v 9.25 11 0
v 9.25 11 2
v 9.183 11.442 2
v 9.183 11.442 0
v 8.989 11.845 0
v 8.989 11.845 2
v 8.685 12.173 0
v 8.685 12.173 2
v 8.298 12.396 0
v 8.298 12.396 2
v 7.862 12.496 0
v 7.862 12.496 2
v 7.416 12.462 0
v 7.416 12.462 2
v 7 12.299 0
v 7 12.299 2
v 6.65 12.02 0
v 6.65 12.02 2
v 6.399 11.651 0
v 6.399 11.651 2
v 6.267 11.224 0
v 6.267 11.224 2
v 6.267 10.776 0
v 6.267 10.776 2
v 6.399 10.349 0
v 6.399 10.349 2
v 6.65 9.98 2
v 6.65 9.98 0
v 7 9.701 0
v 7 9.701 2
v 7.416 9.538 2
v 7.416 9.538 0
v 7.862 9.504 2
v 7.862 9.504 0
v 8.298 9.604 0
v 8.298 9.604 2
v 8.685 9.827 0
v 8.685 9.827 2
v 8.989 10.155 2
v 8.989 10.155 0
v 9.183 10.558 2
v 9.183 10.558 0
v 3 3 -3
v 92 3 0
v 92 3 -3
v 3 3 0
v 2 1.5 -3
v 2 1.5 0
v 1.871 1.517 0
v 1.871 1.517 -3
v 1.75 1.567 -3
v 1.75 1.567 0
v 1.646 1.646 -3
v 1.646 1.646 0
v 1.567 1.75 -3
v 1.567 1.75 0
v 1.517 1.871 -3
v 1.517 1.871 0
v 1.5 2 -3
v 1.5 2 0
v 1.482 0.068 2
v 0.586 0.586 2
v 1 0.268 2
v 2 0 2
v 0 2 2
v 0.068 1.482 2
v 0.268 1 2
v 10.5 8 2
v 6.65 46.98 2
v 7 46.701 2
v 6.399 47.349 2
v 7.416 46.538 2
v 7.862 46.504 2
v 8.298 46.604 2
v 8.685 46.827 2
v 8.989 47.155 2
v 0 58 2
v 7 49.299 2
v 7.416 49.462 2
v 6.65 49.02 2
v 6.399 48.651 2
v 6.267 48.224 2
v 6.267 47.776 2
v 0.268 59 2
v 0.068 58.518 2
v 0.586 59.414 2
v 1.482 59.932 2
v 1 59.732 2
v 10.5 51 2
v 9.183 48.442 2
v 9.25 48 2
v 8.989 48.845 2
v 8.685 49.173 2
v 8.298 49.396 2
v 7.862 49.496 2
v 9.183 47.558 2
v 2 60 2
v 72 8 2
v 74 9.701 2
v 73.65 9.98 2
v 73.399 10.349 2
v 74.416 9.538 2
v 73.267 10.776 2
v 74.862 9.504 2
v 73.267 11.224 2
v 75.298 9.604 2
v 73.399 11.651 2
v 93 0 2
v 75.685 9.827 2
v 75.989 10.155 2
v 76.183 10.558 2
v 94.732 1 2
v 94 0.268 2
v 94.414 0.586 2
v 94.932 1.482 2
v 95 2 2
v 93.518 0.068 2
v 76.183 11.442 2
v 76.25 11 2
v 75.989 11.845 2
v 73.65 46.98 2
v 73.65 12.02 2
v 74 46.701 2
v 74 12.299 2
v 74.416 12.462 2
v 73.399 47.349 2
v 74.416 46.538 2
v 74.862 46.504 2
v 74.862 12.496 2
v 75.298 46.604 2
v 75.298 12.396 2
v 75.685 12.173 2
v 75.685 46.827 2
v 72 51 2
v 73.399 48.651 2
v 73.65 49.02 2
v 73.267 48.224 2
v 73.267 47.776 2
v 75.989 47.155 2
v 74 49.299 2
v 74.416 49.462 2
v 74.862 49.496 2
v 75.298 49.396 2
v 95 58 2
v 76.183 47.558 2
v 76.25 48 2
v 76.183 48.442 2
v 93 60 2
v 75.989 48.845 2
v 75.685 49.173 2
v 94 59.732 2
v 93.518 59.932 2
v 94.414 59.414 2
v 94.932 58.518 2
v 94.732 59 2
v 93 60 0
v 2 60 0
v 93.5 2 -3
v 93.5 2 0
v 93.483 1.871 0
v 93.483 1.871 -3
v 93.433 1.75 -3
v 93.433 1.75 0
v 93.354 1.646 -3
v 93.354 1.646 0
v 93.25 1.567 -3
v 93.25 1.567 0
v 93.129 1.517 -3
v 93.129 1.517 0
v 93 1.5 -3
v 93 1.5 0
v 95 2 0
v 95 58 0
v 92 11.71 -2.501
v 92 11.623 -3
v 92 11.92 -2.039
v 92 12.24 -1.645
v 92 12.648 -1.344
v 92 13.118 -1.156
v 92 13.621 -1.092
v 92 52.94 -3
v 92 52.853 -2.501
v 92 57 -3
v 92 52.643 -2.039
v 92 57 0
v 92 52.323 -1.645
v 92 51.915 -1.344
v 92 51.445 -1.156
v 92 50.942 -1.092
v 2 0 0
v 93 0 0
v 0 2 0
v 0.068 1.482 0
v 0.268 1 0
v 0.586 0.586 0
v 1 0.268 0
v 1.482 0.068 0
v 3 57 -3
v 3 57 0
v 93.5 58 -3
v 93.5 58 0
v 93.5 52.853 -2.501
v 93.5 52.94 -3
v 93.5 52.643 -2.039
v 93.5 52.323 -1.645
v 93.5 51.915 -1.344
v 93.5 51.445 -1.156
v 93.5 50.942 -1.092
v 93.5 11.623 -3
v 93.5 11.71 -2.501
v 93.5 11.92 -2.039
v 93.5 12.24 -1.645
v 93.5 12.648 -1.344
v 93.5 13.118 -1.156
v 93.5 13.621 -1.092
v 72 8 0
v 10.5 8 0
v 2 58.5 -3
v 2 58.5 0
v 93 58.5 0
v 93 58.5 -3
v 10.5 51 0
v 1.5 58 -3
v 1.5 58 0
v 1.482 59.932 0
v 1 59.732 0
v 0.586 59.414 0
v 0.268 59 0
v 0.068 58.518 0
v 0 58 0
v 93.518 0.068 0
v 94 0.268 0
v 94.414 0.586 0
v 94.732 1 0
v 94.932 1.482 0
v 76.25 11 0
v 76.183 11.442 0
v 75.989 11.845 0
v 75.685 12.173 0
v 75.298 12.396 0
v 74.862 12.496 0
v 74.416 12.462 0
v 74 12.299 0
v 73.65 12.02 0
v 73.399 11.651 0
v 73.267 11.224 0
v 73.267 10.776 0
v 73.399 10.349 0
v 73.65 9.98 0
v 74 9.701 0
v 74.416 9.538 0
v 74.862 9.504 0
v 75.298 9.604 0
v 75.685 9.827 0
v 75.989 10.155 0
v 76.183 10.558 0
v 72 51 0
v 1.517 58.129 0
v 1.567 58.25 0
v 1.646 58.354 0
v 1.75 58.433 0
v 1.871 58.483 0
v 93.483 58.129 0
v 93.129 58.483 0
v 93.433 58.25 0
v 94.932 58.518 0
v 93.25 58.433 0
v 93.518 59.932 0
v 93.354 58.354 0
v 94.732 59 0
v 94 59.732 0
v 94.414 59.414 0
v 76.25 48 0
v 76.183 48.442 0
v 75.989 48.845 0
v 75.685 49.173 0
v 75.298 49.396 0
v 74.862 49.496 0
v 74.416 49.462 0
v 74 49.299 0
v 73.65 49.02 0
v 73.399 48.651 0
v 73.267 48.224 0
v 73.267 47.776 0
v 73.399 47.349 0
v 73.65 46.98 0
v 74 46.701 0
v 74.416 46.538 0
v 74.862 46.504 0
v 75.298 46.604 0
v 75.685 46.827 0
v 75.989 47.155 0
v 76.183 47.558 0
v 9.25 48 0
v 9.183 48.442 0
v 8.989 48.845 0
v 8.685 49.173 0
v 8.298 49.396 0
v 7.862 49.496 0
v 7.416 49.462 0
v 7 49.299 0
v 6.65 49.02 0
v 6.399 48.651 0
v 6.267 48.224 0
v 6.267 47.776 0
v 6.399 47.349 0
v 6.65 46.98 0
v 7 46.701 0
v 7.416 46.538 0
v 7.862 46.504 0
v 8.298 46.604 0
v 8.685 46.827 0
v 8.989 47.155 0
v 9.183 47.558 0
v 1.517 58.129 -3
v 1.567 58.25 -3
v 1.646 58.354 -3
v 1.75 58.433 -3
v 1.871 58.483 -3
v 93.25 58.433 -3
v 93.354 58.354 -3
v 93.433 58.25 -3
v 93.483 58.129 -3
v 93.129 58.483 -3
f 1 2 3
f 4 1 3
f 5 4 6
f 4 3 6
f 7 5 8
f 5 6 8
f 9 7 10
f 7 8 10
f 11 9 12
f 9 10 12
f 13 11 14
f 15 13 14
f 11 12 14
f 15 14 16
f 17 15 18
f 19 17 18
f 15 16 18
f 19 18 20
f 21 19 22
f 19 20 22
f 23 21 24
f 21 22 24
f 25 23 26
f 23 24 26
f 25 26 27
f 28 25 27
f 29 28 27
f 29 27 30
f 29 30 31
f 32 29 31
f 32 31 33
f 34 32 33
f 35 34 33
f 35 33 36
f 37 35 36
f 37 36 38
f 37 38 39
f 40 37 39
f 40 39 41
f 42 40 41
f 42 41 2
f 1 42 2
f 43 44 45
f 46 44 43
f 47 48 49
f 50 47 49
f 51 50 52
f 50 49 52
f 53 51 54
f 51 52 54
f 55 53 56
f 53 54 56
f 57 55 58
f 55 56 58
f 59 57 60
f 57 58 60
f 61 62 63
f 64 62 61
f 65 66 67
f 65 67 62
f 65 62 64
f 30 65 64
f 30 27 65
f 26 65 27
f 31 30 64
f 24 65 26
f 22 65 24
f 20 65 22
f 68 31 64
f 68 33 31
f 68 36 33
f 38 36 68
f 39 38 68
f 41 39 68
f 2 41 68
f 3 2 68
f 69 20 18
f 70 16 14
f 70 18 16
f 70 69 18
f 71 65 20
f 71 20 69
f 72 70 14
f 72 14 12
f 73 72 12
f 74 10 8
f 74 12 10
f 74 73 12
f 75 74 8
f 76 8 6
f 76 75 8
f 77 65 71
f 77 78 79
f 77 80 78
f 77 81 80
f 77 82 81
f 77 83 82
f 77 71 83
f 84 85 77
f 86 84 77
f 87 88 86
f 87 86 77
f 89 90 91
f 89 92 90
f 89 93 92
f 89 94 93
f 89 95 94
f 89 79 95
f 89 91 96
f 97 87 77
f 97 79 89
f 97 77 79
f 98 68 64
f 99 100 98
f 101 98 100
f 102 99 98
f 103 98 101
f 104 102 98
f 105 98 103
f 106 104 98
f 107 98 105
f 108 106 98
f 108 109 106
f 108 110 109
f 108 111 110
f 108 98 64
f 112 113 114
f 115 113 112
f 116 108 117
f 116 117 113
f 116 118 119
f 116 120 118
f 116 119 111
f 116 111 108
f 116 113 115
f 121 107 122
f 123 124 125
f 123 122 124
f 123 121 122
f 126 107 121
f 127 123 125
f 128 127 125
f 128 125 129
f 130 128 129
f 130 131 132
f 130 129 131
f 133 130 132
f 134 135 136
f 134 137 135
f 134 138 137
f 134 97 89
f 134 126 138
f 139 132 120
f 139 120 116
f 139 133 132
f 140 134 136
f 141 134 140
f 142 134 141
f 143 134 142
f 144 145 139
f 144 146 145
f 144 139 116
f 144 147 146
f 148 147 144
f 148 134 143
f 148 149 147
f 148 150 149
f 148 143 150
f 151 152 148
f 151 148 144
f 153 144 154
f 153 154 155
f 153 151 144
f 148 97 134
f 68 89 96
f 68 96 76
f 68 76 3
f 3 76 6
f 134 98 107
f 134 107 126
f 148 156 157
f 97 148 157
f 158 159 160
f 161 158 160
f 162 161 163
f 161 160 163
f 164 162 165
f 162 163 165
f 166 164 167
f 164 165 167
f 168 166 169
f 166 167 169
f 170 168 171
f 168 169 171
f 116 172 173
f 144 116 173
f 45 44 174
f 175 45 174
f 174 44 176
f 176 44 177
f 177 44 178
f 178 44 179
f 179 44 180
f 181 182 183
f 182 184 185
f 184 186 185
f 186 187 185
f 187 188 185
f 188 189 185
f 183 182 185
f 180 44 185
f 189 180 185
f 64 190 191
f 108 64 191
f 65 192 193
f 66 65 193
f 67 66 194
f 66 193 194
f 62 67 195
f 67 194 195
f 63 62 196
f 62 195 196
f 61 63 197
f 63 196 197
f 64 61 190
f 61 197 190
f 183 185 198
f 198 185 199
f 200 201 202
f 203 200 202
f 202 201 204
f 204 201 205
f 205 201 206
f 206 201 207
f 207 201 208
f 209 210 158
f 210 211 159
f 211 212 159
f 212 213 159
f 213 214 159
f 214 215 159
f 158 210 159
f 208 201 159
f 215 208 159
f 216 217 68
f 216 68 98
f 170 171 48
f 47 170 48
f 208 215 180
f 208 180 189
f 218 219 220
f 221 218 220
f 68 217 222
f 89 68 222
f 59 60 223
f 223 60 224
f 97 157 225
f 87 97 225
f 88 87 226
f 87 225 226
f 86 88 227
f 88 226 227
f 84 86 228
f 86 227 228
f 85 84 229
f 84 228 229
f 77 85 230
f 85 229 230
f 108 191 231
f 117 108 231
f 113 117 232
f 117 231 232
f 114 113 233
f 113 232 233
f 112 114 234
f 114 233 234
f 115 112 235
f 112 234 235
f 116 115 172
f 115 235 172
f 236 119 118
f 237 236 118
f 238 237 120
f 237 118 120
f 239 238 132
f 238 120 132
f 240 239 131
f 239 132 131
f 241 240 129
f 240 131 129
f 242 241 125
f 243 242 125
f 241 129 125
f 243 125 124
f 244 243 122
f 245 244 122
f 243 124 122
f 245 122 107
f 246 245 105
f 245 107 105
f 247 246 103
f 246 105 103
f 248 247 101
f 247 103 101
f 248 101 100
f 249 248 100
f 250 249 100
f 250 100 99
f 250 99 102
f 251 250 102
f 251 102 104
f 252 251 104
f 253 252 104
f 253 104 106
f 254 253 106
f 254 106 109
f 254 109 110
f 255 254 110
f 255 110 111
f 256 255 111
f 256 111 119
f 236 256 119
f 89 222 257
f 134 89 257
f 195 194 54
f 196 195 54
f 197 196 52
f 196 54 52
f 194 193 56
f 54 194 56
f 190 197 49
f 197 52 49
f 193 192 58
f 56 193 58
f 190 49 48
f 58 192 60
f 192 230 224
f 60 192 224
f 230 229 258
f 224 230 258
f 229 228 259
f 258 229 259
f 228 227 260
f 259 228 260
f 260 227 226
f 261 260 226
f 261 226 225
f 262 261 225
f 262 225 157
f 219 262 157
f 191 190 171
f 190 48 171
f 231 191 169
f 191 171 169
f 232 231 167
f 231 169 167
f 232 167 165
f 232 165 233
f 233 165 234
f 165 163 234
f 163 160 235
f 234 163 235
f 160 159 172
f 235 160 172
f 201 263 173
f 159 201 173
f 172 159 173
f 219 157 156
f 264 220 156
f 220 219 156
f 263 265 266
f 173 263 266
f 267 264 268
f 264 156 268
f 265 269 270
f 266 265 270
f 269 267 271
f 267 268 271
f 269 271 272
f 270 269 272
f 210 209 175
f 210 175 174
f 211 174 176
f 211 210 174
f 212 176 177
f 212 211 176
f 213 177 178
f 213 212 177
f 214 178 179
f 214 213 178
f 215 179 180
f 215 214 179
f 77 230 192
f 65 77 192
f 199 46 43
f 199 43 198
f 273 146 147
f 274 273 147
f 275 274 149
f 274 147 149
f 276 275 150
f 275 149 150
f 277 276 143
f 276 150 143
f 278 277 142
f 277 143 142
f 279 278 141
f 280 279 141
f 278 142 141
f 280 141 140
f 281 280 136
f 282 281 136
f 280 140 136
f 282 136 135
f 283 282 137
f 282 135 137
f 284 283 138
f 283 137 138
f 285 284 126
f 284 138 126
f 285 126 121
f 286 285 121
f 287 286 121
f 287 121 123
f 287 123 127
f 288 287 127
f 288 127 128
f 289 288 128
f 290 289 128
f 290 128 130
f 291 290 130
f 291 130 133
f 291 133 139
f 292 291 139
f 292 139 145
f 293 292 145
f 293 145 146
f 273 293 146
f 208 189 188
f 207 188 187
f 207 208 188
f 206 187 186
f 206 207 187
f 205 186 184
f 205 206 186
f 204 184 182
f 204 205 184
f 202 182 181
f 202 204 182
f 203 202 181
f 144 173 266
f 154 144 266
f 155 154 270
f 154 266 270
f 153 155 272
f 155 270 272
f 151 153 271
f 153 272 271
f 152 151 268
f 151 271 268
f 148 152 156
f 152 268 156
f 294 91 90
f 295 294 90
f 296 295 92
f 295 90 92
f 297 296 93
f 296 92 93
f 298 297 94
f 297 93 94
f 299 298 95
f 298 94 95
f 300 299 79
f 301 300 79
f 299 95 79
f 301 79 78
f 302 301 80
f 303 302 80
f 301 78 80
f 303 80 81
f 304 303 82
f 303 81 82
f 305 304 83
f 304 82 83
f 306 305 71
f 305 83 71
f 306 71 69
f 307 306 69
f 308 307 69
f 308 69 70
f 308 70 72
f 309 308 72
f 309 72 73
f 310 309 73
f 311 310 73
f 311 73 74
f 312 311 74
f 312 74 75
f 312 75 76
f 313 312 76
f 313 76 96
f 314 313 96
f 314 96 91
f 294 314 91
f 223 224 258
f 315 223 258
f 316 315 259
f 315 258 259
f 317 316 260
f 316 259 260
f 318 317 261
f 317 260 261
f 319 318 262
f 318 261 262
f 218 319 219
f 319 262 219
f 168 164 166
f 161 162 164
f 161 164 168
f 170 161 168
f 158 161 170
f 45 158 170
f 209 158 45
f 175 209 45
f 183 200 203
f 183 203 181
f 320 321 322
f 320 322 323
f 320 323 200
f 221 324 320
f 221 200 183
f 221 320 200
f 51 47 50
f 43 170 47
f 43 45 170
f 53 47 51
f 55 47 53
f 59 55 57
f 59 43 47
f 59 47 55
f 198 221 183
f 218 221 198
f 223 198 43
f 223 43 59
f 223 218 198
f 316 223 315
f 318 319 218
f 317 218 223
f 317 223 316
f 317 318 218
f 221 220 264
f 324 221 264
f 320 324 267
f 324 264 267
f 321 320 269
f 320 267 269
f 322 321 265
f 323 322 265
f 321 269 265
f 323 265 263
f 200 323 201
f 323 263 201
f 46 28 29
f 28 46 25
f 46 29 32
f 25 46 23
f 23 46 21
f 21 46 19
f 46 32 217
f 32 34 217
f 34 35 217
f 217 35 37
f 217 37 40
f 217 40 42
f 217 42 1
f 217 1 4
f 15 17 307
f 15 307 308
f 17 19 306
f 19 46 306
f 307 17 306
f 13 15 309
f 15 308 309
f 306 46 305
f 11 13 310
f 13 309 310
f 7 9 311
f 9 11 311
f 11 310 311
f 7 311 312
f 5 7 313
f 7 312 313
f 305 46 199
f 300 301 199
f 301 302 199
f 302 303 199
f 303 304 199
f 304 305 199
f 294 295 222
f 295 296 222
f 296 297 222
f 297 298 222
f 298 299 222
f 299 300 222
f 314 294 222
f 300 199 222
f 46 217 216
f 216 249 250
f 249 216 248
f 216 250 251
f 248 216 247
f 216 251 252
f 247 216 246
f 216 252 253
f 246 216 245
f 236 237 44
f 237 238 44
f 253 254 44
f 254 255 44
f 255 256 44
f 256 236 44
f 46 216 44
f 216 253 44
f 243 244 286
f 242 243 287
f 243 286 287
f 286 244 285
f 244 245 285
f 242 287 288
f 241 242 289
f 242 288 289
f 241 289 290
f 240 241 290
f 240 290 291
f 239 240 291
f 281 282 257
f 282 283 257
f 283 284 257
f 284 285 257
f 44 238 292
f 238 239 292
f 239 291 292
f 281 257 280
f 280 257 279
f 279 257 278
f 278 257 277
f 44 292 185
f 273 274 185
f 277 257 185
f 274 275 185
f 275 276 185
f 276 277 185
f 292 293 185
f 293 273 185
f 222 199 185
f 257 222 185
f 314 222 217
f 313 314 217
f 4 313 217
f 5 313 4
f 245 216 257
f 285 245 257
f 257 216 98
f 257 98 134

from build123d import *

# Parameters (mm, degrees)
SKETCH1_W           = 61.5
SKETCH1_H           = 43
BOSS_EXTRUDE1_DEPTH = 2
SKETCH2_W           = 89
SKETCH2_H           = 54
BOSS_EXTRUDE2_DEPTH = 3
CUT_EXTRUDE1_REACH  = 114.472
SKETCH3_R           = 1.5
CUT_EXTRUDE2_REACH  = 113.136


with BuildPart() as part:
    # Sketch1 → Boss-Extrude1 (new body)
    with BuildSketch(Plane.XY):
        with BuildLine():
            Line((2, 0), (93, 0))
            ThreePointArc((93, 0), (94.414213562, 0.585786438), (95, 2))
            Line((95, 2), (95, 58))
            ThreePointArc((95, 58), (94.414213562, 59.414213562), (93, 60))
            Line((93, 60), (2, 60))
            ThreePointArc((2, 60), (0.585786438, 59.414213562), (0, 58))
            Line((0, 58), (0, 2))
            ThreePointArc((0, 2), (0.585786438, 0.585786438), (2, 0))
        make_face()
        with Locations((41.25, 29.5)):
            Rectangle(SKETCH1_W, SKETCH1_H, mode=Mode.SUBTRACT)
    extrude(amount=BOSS_EXTRUDE1_DEPTH)

    # Sketch2 → Boss-Extrude2 (add)
    with BuildSketch(Plane(origin=(0, 0, 0), x_dir=(-1, 0, 0), z_dir=(0, 0, -1))):
        with BuildLine():
            Line((-93.5, 58), (-93.5, 2))
            ThreePointArc((-93.5, 2), (-93.353553391, 1.646446609), (-93, 1.5))
            Line((-93, 1.5), (-2, 1.5))
            ThreePointArc((-2, 1.5), (-1.646446609, 1.646446609), (-1.5, 2))
            Line((-1.5, 2), (-1.5, 58))
            ThreePointArc((-1.5, 58), (-1.646446609, 58.353553391), (-2, 58.5))
            Line((-2, 58.5), (-93, 58.5))
            ThreePointArc((-93, 58.5), (-93.353553391, 58.353553391), (-93.5, 58))
        make_face()
        with Locations((-47.5, 30)):
            Rectangle(SKETCH2_W, SKETCH2_H, mode=Mode.SUBTRACT)
    extrude(amount=BOSS_EXTRUDE2_DEPTH)

    # Sketch3 → Cut-Extrude1 (cut, up to next)
    with BuildSketch(Plane.XY.offset(2), mode=Mode.PRIVATE) as cut_extrude1_sk1:
        with Locations((7.75, 48)):
            Circle(SKETCH3_R)
    cut_extrude1_tool1 = extrude(cut_extrude1_sk1.sketch, amount=-CUT_EXTRUDE1_REACH, mode=Mode.PRIVATE) & part.part
    # Sketch3 → Cut-Extrude1 (cut, up to next)
    with BuildSketch(Plane.XY.offset(2), mode=Mode.PRIVATE) as cut_extrude1_sk2:
        with Locations((74.75, 48)):
            Circle(SKETCH3_R)
    cut_extrude1_tool2 = extrude(cut_extrude1_sk2.sketch, amount=-CUT_EXTRUDE1_REACH, mode=Mode.PRIVATE) & part.part
    # Sketch3 → Cut-Extrude1 (cut, up to next)
    with BuildSketch(Plane.XY.offset(2), mode=Mode.PRIVATE) as cut_extrude1_sk3:
        with Locations((7.75, 11)):
            Circle(SKETCH3_R)
    cut_extrude1_tool3 = extrude(cut_extrude1_sk3.sketch, amount=-CUT_EXTRUDE1_REACH, mode=Mode.PRIVATE) & part.part
    # Sketch3 → Cut-Extrude1 (cut, up to next)
    with BuildSketch(Plane.XY.offset(2), mode=Mode.PRIVATE) as cut_extrude1_sk4:
        with Locations((74.75, 11)):
            Circle(SKETCH3_R)
    cut_extrude1_tool4 = extrude(cut_extrude1_sk4.sketch, amount=-CUT_EXTRUDE1_REACH, mode=Mode.PRIVATE) & part.part
    add(cut_extrude1_tool1.solids().sort_by_distance((7.75, 48, 2))[0], mode=Mode.SUBTRACT)
    add(cut_extrude1_tool2.solids().sort_by_distance((74.75, 48, 2))[0], mode=Mode.SUBTRACT)
    add(cut_extrude1_tool3.solids().sort_by_distance((7.75, 11, 2))[0], mode=Mode.SUBTRACT)
    add(cut_extrude1_tool4.solids().sort_by_distance((74.75, 11, 2))[0], mode=Mode.SUBTRACT)

    # Sketch4 → Cut-Extrude2 (cut, up to next)
    with BuildSketch(Plane(origin=(93.5, 0, 0), x_dir=(0, 0, -1), z_dir=(1, 0, 0)), mode=Mode.PRIVATE) as cut_extrude2_sk1:
        with BuildLine():
            Line((6.35854024, 11.62115589), (3.091503029, 11.62115589))
            ThreePointArc((3.091503029, 11.62115589), (1.677289466, 12.206942328), (1.091503029, 13.62115589))
            Line((1.091503029, 13.62115589), (1.091503029, 50.941867475))
            ThreePointArc((1.091503029, 50.941867475), (1.677289466, 52.356081037), (3.091503029, 52.941867475))
            Line((3.091503029, 52.941867475), (6.35854024, 52.941867475))
            ThreePointArc((6.35854024, 52.941867475), (7.772753802, 52.356081037), (8.35854024, 50.941867475))
            Line((8.35854024, 50.941867475), (8.35854024, 13.62115589))
            ThreePointArc((8.35854024, 13.62115589), (7.772753802, 12.206942328), (6.35854024, 11.62115589))
        make_face()
    cut_extrude2_tool1 = extrude(cut_extrude2_sk1.sketch, amount=-CUT_EXTRUDE2_REACH, mode=Mode.PRIVATE) & part.part
    add(cut_extrude2_tool1.solids().sort_by_distance((93.5, 32.281512, -4.725022))[0], mode=Mode.SUBTRACT)


solid = part.part
